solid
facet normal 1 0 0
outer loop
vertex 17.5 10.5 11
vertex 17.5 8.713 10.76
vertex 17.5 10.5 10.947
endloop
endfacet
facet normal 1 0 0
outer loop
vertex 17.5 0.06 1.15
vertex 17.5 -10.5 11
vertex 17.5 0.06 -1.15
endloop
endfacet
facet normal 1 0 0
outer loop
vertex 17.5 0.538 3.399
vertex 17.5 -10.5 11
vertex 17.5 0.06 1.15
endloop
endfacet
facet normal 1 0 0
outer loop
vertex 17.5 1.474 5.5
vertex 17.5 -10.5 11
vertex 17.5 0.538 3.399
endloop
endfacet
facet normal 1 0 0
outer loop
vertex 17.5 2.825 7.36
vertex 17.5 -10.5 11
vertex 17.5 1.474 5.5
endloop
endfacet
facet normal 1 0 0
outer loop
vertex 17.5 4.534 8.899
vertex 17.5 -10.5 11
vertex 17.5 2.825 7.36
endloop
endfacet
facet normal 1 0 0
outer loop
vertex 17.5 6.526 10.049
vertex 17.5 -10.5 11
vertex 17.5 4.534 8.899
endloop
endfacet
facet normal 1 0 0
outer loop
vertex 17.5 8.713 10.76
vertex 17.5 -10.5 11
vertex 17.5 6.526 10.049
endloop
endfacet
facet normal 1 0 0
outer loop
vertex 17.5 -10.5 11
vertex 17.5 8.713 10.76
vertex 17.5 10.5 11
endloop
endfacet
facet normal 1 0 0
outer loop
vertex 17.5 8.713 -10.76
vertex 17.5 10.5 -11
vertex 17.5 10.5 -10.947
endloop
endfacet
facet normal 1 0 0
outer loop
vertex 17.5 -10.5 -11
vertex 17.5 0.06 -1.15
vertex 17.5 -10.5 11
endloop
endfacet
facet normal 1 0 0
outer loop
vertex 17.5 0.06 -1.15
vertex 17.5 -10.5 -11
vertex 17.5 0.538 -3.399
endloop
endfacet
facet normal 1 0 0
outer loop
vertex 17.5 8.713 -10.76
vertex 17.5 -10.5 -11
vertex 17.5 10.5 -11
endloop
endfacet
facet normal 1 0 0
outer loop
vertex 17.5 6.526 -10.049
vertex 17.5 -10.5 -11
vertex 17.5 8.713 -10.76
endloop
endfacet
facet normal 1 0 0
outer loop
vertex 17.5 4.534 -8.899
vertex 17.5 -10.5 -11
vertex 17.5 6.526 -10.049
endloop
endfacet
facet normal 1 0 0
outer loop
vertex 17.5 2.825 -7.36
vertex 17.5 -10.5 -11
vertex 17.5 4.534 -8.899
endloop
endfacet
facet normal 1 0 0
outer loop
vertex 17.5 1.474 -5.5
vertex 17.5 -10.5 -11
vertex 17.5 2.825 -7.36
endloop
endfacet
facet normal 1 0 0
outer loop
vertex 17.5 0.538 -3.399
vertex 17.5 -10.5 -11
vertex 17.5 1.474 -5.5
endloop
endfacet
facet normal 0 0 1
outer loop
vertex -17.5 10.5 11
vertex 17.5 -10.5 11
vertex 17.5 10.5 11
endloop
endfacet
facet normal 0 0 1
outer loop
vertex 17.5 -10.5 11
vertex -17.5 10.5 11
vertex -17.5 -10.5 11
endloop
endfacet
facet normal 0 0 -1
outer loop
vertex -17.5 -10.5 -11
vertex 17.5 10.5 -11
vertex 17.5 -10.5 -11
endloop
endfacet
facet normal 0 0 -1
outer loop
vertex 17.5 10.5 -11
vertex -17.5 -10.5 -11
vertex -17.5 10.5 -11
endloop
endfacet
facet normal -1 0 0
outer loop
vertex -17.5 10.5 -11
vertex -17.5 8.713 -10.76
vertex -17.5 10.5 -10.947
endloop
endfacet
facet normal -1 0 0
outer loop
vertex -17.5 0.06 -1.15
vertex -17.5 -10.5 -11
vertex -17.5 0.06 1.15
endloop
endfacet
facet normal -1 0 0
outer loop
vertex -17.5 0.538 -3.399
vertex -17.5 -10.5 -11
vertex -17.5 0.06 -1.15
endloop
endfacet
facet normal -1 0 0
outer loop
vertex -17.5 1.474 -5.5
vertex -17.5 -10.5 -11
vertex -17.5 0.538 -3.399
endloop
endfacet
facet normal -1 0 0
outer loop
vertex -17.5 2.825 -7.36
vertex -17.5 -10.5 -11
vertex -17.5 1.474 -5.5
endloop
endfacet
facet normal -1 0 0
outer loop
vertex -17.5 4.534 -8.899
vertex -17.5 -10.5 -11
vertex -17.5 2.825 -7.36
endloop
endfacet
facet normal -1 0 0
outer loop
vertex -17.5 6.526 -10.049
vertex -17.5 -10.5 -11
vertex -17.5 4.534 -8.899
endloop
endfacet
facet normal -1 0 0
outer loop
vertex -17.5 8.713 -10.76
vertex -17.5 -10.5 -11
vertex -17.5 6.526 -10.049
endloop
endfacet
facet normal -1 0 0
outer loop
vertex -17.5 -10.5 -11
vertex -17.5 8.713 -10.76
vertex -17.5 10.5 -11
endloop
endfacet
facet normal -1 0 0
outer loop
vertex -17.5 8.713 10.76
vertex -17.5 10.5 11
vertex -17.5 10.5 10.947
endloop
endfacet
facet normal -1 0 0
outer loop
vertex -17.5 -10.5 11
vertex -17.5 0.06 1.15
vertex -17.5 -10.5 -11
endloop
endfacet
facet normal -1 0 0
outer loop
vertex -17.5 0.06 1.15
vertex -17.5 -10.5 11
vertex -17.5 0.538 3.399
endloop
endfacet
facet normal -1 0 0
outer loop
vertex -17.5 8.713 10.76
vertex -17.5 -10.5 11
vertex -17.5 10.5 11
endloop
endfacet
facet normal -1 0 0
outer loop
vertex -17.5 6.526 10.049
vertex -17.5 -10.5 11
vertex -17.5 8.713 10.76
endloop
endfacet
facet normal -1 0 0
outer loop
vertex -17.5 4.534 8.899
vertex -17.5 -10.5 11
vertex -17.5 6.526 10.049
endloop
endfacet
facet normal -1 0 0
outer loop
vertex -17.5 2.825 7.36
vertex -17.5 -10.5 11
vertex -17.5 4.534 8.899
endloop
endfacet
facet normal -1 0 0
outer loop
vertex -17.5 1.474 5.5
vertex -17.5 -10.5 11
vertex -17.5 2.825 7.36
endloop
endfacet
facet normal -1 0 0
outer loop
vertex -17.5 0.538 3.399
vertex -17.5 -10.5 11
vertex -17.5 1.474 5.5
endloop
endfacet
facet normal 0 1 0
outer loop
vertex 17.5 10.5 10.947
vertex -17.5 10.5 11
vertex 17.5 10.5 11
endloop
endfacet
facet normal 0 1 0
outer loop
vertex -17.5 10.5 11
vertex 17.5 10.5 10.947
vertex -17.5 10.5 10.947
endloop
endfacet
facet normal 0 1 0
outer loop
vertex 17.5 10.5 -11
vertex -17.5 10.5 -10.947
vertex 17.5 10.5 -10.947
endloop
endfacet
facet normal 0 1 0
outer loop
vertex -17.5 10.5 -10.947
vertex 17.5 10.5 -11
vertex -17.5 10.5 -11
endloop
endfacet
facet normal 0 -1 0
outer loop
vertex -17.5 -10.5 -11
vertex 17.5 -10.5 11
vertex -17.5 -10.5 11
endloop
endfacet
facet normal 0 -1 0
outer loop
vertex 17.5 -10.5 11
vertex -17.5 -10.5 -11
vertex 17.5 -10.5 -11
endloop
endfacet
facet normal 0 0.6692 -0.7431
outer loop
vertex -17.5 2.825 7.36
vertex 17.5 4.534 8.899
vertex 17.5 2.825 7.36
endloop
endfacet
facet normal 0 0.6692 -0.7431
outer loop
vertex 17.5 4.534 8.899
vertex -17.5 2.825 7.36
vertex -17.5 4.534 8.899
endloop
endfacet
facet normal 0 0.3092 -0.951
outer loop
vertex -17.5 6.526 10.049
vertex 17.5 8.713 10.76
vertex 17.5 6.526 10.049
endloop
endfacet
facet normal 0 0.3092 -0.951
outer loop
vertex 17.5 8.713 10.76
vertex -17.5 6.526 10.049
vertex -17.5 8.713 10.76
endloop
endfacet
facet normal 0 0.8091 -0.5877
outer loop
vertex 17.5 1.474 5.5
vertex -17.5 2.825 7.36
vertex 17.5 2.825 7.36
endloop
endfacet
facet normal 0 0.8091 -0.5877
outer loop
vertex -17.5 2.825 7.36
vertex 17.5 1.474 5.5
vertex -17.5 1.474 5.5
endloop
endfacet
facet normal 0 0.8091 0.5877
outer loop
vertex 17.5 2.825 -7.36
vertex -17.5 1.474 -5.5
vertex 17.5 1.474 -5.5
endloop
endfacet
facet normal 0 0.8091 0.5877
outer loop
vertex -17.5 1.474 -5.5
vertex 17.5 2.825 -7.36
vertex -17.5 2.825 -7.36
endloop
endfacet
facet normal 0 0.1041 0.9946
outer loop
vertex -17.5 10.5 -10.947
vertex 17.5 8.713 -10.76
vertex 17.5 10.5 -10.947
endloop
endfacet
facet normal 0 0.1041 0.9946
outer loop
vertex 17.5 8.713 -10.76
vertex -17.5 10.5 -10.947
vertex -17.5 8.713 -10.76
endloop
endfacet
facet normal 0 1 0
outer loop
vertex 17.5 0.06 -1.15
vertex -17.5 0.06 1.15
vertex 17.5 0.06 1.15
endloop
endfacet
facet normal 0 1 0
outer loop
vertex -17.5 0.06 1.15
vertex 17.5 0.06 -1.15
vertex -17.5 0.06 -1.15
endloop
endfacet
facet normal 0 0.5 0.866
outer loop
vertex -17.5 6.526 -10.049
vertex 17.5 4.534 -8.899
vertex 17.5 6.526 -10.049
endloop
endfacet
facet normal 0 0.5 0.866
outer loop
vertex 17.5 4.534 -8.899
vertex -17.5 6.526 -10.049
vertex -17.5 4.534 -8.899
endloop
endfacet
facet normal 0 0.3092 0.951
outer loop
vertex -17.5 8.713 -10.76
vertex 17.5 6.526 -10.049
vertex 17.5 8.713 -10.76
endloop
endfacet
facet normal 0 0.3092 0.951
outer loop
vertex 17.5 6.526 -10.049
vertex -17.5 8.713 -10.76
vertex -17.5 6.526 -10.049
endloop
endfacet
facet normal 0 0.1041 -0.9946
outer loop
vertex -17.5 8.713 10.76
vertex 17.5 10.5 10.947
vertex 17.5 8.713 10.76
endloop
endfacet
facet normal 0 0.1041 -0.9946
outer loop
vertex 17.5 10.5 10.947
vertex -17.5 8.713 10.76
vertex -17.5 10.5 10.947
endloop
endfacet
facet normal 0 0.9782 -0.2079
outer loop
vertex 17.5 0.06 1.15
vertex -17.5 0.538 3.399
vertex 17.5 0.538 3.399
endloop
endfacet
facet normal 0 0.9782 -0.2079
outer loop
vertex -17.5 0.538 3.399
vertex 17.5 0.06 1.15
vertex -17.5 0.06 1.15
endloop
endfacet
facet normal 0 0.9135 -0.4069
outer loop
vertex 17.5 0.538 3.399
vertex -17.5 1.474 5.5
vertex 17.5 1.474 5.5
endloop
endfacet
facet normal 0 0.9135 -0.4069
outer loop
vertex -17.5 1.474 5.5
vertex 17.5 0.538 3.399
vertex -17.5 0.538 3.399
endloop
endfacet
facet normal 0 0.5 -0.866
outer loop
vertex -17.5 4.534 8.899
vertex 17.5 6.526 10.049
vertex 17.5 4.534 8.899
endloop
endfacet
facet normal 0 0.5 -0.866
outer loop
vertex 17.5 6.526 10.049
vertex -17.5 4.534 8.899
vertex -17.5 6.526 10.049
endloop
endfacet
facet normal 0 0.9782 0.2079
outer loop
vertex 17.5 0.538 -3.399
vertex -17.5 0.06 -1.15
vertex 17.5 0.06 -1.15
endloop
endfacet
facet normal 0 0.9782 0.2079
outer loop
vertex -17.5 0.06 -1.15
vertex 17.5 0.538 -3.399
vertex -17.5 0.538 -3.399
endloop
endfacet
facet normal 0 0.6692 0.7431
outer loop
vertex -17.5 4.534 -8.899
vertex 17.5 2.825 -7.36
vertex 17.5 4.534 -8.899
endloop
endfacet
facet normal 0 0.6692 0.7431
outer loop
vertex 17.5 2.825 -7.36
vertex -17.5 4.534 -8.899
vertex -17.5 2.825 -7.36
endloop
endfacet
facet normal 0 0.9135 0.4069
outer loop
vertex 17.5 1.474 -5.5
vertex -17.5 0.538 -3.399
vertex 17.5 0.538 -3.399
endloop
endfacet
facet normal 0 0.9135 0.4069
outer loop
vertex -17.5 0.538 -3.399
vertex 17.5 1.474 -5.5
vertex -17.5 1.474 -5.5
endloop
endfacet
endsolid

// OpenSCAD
// mount for carbon fiber tube

bar_radius = 22;
tol = 0.001;
mount_width = 35;
mount_height = 10;

zip_tie_width = 6;
difference() {
cube([mount_width, bar_radius/2 + mount_height, bar_radius], center=true);

translate([0, bar_radius/2, 0])
rotate([0, 90, 0])
cylinder(r=bar_radius/2, h=mount_width+5, center=true);
}
